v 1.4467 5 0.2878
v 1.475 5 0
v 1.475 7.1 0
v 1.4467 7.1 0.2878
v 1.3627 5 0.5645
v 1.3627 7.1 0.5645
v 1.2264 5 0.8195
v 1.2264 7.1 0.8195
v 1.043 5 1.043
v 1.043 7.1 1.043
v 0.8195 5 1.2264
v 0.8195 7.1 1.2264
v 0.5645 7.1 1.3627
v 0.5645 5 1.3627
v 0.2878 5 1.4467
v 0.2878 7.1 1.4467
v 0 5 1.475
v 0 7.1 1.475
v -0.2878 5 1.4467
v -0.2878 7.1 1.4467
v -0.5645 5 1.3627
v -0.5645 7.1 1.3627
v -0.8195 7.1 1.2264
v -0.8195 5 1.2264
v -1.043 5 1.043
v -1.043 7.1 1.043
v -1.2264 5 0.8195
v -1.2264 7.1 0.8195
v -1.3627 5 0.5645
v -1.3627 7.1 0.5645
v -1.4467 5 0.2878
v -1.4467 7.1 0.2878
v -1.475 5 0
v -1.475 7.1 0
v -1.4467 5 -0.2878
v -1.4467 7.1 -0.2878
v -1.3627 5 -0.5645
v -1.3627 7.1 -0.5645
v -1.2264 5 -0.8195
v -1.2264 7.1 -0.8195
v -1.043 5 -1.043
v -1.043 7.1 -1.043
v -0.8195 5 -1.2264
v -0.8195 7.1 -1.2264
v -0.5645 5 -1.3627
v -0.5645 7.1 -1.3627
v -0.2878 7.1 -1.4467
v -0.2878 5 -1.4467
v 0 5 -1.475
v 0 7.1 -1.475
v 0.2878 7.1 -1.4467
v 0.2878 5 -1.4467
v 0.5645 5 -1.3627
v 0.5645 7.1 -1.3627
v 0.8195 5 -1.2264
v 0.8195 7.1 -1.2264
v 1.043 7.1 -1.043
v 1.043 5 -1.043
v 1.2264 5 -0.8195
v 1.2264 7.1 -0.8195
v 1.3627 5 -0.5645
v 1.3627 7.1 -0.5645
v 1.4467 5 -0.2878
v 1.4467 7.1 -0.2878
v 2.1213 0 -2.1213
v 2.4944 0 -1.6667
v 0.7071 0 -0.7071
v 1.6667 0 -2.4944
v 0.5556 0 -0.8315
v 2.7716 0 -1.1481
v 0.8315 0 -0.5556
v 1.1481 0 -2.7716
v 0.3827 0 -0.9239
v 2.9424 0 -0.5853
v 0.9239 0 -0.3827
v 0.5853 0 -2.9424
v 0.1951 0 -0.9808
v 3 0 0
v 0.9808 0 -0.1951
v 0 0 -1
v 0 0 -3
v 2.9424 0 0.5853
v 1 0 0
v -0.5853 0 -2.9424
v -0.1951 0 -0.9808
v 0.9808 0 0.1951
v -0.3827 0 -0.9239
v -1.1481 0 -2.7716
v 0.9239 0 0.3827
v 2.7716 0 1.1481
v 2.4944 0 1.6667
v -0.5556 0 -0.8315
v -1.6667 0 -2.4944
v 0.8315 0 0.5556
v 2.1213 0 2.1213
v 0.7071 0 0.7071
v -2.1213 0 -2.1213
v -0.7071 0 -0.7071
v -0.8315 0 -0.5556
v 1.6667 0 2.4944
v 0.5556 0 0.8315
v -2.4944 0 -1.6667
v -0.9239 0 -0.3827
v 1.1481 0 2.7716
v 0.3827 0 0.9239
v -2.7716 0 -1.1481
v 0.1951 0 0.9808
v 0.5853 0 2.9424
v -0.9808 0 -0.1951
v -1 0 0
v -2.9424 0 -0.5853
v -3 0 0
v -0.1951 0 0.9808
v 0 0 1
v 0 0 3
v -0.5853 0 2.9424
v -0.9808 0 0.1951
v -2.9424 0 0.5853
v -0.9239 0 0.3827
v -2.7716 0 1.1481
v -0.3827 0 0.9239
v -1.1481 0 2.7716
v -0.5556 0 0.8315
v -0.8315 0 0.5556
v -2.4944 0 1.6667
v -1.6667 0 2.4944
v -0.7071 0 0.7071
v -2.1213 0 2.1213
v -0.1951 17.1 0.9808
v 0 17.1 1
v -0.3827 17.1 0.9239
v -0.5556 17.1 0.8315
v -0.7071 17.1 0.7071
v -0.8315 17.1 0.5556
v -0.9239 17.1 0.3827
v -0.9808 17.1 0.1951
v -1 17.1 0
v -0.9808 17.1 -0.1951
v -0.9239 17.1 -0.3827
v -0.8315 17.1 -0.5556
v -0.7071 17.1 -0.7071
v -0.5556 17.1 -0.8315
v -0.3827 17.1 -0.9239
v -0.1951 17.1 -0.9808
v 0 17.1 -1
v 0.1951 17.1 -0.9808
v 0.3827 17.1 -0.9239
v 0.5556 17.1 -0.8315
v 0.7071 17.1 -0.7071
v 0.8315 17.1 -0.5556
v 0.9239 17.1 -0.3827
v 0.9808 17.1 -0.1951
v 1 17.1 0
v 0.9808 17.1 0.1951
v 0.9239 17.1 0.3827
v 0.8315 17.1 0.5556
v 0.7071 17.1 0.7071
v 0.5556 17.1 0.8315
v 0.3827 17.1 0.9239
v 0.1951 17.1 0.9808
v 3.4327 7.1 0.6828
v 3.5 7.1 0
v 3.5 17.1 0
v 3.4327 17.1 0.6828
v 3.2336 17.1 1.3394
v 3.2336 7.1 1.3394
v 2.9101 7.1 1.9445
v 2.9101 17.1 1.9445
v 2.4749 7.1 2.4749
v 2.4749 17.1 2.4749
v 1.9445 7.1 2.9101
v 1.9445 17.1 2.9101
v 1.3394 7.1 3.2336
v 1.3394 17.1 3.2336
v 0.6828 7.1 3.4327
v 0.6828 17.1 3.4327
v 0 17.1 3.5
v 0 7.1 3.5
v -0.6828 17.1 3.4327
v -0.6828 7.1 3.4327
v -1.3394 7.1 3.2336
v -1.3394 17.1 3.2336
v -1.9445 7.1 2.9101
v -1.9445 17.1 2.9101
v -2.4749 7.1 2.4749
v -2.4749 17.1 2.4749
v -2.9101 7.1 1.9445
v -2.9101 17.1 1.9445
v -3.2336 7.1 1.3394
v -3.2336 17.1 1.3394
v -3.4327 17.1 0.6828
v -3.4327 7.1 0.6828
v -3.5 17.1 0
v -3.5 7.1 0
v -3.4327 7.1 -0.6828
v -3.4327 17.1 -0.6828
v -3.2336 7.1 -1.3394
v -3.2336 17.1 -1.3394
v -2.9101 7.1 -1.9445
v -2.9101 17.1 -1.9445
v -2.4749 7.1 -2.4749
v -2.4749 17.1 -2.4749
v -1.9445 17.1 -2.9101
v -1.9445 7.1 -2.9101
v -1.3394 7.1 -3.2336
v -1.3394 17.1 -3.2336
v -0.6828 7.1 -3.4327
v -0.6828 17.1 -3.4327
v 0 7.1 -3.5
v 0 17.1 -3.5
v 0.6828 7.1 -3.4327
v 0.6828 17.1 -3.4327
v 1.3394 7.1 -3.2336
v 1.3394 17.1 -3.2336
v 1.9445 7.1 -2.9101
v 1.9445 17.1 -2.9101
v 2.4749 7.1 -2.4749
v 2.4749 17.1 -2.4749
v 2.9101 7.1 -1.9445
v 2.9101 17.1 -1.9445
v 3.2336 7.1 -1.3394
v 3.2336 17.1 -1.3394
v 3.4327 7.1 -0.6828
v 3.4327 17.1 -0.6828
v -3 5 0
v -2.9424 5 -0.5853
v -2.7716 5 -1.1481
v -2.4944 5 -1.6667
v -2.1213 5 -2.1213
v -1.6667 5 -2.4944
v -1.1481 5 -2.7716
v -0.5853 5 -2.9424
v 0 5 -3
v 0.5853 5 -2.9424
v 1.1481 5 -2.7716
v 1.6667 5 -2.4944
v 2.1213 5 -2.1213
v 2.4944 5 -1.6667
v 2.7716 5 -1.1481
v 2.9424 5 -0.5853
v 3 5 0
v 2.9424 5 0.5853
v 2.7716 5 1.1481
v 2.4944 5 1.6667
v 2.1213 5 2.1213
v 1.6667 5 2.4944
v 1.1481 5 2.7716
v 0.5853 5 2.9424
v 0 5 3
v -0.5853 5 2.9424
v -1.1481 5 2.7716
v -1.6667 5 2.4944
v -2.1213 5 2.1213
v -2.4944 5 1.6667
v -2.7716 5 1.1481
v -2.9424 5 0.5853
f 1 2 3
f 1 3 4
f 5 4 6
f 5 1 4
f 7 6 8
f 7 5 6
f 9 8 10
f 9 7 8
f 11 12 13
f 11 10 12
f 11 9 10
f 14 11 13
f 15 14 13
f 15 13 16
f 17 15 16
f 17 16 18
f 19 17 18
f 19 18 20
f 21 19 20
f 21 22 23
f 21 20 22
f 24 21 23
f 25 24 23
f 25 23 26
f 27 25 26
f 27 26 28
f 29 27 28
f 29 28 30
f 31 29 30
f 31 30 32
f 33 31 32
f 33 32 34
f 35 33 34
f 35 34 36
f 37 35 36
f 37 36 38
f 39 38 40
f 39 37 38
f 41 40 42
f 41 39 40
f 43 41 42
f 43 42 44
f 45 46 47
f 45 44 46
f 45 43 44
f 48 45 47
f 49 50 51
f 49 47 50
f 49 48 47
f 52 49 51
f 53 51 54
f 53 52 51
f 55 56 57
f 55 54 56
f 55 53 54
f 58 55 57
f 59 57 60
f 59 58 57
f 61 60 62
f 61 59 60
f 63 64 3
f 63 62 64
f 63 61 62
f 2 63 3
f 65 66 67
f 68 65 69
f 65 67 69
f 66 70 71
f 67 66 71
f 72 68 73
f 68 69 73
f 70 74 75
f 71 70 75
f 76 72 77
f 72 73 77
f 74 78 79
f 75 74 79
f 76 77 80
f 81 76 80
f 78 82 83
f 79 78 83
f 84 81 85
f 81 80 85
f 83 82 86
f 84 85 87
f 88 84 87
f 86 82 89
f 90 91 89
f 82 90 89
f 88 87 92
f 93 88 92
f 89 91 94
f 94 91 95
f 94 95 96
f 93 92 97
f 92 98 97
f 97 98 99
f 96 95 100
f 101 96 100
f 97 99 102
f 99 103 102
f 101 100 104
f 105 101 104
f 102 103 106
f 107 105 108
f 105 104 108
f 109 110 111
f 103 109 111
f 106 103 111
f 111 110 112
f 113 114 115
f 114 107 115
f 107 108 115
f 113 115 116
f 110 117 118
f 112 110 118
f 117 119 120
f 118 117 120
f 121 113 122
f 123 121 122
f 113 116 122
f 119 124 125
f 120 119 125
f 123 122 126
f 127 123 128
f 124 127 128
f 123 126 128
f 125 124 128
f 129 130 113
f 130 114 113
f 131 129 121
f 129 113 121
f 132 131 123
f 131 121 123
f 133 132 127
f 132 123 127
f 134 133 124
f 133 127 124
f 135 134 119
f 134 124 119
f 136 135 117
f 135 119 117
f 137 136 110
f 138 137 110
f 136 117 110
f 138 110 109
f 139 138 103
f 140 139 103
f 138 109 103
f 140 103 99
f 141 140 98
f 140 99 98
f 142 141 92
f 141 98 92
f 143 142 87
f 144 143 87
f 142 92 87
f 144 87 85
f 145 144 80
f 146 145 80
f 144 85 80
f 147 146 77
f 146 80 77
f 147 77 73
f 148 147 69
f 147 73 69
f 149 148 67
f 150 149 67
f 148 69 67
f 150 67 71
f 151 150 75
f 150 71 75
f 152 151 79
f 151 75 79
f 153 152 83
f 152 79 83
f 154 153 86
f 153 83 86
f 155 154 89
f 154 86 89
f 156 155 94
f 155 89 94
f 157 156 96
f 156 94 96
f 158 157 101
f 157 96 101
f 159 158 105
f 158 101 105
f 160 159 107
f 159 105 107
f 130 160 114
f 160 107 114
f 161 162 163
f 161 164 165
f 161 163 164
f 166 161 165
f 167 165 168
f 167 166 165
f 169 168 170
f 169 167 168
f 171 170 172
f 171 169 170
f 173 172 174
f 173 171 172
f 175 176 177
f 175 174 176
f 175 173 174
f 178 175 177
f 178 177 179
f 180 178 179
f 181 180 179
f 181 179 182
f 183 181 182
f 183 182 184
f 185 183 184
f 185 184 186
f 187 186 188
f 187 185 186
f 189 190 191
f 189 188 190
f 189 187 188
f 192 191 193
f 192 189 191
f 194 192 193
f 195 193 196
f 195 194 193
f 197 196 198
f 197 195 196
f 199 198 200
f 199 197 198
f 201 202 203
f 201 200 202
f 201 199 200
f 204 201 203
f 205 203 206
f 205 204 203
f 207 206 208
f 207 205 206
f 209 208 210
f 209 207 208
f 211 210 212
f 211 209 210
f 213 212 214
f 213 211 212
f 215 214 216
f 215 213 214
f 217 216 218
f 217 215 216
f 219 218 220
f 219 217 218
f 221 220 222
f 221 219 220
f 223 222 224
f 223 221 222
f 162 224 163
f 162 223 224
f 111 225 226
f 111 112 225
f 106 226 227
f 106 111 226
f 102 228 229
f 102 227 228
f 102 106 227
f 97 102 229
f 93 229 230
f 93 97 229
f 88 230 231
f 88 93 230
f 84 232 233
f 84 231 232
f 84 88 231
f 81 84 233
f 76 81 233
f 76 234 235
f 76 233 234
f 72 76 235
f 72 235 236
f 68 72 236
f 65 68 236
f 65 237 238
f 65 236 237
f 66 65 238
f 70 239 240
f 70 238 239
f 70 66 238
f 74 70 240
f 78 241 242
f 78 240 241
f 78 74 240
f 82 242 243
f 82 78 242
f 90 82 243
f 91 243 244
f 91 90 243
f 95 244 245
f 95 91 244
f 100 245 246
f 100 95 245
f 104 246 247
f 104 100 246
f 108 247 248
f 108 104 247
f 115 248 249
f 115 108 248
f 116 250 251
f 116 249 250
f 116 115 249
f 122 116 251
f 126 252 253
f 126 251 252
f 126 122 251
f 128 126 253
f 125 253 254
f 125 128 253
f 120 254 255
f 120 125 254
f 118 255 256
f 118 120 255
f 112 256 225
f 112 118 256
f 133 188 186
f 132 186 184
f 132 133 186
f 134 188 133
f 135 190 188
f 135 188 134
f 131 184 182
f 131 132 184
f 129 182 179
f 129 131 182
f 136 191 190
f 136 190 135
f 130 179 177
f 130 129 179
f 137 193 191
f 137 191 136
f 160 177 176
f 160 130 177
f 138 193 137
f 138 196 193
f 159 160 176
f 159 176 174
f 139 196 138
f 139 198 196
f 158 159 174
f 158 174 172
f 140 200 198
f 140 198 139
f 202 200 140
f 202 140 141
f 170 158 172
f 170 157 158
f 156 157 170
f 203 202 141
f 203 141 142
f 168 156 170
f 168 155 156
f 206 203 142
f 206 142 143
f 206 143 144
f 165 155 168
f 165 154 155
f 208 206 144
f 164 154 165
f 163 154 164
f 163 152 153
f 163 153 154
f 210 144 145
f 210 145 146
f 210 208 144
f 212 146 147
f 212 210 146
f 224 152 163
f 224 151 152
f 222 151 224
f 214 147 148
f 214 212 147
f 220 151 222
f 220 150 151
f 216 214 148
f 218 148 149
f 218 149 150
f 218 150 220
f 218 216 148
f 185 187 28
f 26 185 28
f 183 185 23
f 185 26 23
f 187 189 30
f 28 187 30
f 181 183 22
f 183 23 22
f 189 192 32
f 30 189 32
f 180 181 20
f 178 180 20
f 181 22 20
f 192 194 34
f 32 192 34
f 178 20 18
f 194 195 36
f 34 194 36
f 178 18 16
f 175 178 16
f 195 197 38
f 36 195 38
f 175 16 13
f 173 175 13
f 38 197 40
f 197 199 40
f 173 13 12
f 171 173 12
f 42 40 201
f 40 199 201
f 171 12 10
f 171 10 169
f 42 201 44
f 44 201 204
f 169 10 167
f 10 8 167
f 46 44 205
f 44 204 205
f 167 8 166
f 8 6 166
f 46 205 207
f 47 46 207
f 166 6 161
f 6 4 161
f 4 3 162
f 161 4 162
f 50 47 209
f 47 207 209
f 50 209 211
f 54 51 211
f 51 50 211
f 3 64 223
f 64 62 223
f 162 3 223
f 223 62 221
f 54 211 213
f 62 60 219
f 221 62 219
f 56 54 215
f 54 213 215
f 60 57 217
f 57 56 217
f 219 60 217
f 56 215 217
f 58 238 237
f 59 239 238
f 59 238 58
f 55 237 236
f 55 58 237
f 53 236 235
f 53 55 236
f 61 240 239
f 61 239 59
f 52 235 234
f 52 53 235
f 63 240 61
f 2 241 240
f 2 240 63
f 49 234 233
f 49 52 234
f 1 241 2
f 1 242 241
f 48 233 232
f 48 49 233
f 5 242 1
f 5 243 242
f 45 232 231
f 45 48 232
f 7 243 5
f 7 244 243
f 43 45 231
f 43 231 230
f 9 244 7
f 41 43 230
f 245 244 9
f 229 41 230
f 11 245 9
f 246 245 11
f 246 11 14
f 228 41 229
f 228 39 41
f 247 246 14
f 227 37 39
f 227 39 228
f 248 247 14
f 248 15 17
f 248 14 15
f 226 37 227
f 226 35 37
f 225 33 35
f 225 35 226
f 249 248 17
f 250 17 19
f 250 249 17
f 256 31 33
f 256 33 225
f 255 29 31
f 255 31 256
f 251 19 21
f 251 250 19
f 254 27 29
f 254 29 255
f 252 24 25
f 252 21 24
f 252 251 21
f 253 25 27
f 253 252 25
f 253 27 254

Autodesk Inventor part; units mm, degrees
ref_plane "YZ Plane" through (0, 0, 0) normal (1, 0, 0) x (0, 1, 0)
ref_plane "XZ Plane" through (0, 0, 0) normal (0, 1, 0) x (-1, 0, 0)
ref_plane "XY Plane" through (0, 0, 0) normal (0, 0, 1) x (1, 0, 0)
sketch "Sketch2" plane through (0, 0, 0) normal (0, 1, 0) x (-1, 0, 0)
  circle A0 centre (0, 0) radius 3
  dimension "d0" = 6
extrude "Extrusion1" add sketch "Sketch2" along normal blind 5
sketch "Sketch3" plane through (0, 5, 0) normal (0, 1, 0) x (1, 0, 0)
  circle A0 centre (0, 0) radius 1.475
  dimension "d3" = 2.95
extrude "Extrusion2" add sketch "Sketch3" along normal blind 2.1
sketch "Sketch4" plane through (0, 7.1, 0) normal (0, 1, 0) x (1, 0, 0)
  circle A0 centre (0, 0) radius 3.5
  dimension "d6" = 7
extrude "Extrusion3" add sketch "Sketch4" along normal blind 10
sketch "Sketch5" plane through (0, 17.1, 0) normal (0, 1, 0) x (1, 0, 0)
  point P0 (0, 0)
  point P1 (0, 0)
hole "Hole1" at (0, 17.1, 0) direction (0, -1, 0) diameter 2 end through all
thread "Thread1" size "M6x1" class "6g" standard "ANSI Metric M Profile" full length
thread "Thread2" size "M7x1" class "6g" standard "ANSI Metric M Profile" full length
properties part number "Chimera Heatbreak" material "Aluminum 6061, Welded"
